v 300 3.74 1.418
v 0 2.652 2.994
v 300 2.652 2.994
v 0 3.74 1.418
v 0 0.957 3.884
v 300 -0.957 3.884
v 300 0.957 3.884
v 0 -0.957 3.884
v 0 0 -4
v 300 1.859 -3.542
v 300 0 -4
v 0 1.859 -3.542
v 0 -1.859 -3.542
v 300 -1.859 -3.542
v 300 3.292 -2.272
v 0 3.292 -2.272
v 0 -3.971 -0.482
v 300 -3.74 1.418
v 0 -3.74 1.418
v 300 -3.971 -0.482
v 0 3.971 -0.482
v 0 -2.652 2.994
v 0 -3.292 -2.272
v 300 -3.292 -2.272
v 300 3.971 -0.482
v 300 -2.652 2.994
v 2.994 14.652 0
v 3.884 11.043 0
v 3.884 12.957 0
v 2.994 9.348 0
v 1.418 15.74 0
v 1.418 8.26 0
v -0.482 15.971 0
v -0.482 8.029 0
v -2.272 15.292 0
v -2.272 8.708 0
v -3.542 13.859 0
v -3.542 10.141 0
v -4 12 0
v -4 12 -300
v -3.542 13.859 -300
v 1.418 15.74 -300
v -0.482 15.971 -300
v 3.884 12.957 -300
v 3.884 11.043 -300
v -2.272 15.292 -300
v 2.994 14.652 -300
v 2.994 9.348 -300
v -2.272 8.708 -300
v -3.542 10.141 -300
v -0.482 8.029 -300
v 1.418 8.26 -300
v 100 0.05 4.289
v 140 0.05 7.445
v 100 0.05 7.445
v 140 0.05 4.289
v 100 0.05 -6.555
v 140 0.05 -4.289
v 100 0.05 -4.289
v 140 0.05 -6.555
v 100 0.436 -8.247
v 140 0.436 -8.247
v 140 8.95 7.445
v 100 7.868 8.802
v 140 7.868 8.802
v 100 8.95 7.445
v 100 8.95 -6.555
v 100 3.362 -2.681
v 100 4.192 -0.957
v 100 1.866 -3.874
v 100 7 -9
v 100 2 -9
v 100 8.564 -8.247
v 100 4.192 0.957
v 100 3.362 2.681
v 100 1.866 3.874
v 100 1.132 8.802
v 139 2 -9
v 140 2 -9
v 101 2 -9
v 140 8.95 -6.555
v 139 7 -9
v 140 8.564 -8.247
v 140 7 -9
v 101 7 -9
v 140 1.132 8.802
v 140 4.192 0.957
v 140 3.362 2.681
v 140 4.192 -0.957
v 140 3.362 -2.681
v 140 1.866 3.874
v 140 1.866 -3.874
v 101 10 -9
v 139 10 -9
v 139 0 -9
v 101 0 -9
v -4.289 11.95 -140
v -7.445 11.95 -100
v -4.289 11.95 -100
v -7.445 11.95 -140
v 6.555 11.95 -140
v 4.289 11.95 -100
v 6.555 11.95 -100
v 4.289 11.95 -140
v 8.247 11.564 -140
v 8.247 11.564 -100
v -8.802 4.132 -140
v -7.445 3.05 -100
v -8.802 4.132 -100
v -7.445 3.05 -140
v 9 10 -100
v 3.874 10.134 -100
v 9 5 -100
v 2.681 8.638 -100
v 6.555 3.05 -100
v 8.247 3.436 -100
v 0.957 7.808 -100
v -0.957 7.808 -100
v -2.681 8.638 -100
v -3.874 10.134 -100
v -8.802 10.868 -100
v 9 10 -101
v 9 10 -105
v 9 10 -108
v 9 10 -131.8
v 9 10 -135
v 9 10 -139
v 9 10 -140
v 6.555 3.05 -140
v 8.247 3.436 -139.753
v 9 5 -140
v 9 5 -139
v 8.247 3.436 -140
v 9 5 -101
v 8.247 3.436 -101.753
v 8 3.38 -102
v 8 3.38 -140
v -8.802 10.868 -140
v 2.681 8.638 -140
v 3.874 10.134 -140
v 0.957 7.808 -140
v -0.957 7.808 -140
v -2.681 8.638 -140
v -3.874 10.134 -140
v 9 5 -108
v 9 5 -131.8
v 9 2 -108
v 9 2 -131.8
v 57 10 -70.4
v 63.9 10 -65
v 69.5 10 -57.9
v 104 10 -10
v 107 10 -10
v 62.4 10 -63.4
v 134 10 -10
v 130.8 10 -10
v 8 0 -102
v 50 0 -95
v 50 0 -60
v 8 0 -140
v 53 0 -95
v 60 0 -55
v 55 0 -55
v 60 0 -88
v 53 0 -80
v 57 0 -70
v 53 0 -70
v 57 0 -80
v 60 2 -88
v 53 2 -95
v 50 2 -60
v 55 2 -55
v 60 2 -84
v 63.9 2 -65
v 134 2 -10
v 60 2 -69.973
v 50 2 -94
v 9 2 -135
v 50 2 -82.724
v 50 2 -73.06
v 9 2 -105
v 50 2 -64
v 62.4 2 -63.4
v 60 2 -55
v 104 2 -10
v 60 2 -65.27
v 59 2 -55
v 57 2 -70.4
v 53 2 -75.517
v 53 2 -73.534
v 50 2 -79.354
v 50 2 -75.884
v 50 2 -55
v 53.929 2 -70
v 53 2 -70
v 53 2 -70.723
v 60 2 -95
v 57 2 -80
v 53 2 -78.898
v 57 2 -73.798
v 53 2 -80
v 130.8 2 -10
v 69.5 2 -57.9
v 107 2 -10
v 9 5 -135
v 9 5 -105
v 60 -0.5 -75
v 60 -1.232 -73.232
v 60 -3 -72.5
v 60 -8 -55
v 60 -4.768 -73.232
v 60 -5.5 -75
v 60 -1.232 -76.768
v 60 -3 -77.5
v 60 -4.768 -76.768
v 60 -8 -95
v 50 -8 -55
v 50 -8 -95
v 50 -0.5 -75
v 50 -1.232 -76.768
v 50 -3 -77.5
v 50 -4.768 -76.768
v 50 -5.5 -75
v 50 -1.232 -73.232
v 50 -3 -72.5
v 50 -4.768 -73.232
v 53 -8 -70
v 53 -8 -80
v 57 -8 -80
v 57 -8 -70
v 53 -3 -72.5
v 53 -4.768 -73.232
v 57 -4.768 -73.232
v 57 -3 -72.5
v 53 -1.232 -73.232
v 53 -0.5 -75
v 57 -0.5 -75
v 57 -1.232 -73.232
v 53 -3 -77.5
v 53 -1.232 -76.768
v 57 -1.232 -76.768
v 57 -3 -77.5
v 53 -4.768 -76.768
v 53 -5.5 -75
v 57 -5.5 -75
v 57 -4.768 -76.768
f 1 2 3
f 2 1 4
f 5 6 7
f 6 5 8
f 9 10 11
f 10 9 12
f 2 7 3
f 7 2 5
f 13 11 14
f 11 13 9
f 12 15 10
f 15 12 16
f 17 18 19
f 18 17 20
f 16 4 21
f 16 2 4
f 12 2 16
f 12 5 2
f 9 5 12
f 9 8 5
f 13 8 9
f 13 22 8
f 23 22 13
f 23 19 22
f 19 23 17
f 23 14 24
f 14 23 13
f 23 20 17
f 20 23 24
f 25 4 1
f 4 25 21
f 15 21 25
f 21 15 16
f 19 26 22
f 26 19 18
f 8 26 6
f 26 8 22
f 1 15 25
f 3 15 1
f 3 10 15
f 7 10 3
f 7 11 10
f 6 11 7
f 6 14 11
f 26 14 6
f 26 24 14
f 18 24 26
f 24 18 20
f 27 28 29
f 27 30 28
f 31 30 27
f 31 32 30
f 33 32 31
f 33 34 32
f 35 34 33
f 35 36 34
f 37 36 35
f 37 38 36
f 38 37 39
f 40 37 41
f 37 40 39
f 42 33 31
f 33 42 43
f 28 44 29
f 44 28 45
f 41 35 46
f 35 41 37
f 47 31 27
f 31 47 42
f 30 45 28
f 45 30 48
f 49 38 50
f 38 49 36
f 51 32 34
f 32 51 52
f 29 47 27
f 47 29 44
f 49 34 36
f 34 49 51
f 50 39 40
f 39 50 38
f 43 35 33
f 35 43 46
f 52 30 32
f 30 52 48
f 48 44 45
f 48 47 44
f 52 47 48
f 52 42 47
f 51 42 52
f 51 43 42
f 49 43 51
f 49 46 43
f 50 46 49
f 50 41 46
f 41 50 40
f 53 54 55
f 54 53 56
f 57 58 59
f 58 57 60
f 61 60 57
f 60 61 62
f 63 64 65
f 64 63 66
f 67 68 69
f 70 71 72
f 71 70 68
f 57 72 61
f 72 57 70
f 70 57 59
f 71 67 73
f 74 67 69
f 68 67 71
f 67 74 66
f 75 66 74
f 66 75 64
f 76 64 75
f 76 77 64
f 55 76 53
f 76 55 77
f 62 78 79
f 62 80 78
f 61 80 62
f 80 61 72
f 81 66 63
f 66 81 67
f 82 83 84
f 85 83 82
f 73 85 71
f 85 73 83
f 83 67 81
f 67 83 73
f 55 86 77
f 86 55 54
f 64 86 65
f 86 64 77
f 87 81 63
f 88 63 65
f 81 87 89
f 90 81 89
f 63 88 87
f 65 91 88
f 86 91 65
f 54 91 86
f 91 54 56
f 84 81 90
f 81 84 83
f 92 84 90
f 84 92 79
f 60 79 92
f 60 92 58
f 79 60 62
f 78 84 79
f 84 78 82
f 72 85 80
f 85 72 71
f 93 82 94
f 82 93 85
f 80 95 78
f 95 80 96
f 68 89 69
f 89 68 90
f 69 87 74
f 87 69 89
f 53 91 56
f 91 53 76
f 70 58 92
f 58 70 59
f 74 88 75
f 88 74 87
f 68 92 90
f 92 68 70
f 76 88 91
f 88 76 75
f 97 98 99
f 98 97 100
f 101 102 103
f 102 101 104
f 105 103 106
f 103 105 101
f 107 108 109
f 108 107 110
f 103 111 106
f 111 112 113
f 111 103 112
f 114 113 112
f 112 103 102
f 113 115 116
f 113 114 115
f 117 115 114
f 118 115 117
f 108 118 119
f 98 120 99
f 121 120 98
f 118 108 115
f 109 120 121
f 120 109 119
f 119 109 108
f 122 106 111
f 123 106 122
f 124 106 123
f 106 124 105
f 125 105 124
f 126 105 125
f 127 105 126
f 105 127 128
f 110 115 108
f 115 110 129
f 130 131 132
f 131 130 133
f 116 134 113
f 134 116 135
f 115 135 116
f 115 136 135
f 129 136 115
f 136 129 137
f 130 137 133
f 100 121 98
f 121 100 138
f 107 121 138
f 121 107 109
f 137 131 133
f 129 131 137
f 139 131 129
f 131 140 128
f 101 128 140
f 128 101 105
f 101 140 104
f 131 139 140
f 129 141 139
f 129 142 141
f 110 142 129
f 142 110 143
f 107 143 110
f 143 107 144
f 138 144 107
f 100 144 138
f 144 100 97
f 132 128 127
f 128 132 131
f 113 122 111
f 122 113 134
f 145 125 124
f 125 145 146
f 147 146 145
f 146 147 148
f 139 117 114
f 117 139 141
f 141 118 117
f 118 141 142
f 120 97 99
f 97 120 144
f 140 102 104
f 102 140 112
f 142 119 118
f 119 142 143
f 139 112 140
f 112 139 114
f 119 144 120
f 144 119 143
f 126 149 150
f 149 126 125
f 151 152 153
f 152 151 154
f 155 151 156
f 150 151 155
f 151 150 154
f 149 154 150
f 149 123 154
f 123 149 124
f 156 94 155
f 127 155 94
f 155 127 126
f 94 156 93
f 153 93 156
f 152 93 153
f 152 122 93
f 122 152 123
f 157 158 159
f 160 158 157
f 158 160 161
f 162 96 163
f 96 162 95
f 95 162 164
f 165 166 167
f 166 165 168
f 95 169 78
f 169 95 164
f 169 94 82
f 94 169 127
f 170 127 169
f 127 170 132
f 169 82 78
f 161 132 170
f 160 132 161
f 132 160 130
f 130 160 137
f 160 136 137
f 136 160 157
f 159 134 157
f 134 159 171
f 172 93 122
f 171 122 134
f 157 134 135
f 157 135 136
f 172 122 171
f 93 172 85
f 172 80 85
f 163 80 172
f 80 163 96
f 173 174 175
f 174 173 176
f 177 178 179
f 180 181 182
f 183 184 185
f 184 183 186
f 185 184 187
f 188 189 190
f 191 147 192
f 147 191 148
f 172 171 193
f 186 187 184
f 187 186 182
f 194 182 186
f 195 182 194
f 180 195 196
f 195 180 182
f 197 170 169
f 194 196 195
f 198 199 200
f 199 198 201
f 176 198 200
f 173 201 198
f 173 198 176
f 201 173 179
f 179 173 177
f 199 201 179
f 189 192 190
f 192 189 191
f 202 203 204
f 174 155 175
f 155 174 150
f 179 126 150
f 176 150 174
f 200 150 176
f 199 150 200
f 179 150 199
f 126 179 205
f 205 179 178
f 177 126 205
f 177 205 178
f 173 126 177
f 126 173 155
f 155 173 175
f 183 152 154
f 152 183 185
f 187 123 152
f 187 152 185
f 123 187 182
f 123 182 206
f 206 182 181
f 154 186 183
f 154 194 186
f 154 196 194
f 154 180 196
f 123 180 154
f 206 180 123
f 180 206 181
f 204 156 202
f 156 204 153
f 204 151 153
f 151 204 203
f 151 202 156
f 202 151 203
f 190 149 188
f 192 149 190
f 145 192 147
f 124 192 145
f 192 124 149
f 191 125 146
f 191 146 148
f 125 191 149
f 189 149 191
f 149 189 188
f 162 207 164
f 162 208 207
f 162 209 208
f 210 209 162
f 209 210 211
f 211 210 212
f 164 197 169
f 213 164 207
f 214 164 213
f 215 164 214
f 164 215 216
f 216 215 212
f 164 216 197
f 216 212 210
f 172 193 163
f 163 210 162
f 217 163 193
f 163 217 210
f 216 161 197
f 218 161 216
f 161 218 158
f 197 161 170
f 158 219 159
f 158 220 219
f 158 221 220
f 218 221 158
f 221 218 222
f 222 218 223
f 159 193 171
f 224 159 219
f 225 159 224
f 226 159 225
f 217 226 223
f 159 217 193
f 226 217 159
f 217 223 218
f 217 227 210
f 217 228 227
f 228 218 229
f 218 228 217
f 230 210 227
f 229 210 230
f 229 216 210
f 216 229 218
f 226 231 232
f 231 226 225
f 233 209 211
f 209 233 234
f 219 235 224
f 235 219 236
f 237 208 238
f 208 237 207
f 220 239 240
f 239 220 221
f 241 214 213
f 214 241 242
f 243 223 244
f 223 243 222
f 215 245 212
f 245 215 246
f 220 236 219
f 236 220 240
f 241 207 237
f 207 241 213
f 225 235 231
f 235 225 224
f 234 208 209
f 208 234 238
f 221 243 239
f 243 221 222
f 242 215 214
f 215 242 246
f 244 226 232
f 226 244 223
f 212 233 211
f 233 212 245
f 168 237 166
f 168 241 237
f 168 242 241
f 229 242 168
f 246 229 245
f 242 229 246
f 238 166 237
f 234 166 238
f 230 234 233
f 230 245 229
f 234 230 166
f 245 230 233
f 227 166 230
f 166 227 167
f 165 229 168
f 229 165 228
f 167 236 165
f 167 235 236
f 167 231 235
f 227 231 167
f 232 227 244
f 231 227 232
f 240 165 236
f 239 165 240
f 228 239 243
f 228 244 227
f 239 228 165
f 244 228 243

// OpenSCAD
dH=12;
r0=2;
offX=100;
offZ=100;

module base(){
	color("WhiteSmoke")rotate([0,90,0]) cylinder(300,r=4);
	color("WhiteSmoke") translate([0,dH,0]) rotate([0,180,0]) cylinder(300,r=4);
}

module clip(){
	difference(){
		minkowski(){
			translate([0,r0,-(18-2*r0)/2]) cube([39,9-2*r0,18-2*r0]);
			rotate([0,90,0]) cylinder(1,r=r0);
		}
		translate([-10,0,0]) rotate([0,90,0]) cylinder(60,r=4.3);
	}
}

module body(){
	rotate([90,0,0])translate ([-53,-258,-10]) difference(){
		linear_extrude(height = 10) import("Stab.dxf",layer="A");
		linear_extrude(height = 8) import("Stab.dxf",layer="B");
	}
}

module lug(){
	difference(){
		cube([10,10,40]);
		translate([-5,5,20]) rotate([0,90,0]) cylinder (20,r=2.5);
		translate([3,-5,15])cube([4,20,10]);
	}
}

module stab(){

	translate([offX,0,0]) clip();
	translate([0,dH,-offZ]) rotate([0,90,180]) clip();
	translate ([9,0,-9]) body();
	translate ([50,-8,-95])lug();
	
}



base();
stab();
